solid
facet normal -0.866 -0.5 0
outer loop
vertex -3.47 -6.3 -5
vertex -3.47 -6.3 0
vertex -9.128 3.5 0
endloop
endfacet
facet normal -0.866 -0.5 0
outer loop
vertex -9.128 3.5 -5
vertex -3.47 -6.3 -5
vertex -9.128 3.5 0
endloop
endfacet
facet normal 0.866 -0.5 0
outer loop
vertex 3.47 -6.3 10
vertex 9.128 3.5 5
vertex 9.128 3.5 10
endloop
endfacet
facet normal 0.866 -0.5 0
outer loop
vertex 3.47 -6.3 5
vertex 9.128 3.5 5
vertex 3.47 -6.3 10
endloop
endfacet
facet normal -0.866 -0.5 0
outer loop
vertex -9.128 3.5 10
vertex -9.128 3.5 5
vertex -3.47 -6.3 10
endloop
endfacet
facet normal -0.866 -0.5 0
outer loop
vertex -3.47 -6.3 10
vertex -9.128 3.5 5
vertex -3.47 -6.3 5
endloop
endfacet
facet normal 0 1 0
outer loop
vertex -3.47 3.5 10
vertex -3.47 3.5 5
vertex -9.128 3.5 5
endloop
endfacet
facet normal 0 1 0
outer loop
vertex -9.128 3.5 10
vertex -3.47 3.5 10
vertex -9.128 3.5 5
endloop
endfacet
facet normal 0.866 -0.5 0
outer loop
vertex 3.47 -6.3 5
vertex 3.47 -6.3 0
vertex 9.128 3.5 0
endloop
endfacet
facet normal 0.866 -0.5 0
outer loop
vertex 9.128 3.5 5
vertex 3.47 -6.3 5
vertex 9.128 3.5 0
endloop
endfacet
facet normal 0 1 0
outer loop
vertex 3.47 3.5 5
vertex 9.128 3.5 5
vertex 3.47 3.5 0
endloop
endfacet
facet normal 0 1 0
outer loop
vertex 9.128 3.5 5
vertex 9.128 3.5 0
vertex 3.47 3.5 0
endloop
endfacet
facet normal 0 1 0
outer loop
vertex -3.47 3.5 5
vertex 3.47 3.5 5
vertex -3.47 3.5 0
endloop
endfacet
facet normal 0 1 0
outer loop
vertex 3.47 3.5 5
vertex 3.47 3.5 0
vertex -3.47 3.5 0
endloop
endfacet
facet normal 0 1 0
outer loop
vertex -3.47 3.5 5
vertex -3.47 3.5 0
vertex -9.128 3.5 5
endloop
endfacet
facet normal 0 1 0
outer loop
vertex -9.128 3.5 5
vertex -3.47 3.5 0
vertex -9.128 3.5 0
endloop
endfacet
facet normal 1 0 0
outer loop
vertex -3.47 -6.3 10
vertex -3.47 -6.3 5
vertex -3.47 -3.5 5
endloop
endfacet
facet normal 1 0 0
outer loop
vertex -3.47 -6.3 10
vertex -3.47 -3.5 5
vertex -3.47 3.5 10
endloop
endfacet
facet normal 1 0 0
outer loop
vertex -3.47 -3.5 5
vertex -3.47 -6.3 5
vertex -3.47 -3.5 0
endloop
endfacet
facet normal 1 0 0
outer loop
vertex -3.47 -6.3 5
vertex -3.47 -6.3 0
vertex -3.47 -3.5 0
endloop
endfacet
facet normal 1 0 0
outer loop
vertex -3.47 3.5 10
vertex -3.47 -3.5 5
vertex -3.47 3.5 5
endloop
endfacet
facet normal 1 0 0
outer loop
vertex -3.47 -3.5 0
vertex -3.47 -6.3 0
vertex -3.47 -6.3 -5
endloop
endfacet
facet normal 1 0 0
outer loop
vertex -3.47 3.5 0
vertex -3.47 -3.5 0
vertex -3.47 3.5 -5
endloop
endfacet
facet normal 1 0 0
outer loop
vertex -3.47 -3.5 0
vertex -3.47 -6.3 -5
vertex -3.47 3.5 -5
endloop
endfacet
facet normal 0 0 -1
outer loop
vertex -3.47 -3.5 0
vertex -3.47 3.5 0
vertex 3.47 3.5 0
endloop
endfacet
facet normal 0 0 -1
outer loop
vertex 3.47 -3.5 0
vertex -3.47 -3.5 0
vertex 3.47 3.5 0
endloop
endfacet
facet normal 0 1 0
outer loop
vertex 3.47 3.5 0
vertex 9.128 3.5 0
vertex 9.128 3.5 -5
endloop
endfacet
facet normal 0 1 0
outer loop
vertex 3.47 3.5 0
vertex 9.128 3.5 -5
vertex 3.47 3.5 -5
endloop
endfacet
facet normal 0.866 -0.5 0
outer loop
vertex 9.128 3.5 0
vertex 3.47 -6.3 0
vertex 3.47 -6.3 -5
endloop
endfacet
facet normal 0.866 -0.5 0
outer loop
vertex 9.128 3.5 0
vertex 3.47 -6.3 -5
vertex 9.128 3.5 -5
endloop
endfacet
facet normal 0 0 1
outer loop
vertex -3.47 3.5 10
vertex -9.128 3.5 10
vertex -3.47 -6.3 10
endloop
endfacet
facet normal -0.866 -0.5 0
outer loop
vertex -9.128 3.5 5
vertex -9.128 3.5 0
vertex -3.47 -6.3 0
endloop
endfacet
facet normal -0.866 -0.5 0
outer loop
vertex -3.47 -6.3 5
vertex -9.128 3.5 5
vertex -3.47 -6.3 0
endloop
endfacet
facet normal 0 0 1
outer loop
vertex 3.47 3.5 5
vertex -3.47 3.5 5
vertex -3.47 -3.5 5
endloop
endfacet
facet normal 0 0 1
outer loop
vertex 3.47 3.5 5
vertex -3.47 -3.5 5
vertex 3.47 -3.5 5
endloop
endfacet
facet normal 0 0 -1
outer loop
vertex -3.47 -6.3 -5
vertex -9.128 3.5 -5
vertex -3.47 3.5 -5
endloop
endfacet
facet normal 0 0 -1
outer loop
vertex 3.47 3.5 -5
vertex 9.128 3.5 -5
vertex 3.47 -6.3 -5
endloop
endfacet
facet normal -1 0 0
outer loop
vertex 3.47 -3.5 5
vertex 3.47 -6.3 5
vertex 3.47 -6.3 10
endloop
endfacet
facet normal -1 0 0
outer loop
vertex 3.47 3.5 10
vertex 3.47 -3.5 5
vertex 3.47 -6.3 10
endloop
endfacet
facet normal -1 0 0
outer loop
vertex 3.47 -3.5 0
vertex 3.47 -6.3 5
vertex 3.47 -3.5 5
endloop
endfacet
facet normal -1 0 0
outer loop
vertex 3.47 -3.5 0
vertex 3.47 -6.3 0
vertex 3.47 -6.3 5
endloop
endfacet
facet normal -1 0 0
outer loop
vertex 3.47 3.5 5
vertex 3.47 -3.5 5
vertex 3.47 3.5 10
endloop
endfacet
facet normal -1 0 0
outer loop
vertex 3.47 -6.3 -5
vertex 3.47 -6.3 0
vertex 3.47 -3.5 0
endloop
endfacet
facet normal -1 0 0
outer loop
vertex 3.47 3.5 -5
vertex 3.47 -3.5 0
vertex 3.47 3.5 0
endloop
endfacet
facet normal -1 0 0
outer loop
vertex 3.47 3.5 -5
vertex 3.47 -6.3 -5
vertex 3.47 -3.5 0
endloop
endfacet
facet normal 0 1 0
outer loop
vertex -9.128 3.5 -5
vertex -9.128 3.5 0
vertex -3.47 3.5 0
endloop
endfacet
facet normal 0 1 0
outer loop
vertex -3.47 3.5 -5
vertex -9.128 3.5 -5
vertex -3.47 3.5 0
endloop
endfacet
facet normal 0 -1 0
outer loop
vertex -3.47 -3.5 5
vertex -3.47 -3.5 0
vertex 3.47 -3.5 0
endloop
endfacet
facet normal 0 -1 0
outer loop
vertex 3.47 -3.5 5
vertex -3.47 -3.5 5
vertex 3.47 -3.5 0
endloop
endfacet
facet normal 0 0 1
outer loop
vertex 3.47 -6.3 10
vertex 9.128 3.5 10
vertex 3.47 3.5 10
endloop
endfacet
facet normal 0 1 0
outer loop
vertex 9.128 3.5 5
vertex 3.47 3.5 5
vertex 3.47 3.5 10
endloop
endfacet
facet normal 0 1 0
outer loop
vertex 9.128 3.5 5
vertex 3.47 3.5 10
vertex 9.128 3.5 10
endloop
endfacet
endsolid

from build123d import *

# Parameters (mm, degrees)
PAD_DEPTH    = 5
PAD001_DEPTH = 5
PAD002_DEPTH = 5


with BuildPart() as part:
    # Sketch → Pad (new body)
    with BuildSketch(Plane.XY):
        Polygon((-3.47, -3.5), (3.47, -3.5), (3.47, -6.3), (9.128033, 3.5), (3.47, 3.5), (-3.47, 3.5), (-9.128033, 3.5), (-3.47, -6.3), align=None)
    extrude(amount=PAD_DEPTH)

    # Sketch001 (on Face9 of Pad) → Pad001 (join)
    with BuildSketch(Plane(origin=(0, 0, 0), x_dir=(1, 0, 0), z_dir=(0, 0, -1))):
        Polygon((-3.47, 6.299921), (-9.128033, -3.500079), (-3.47, -3.500079), align=None)
        Polygon((3.47, 6.299921), (9.128033, -3.500079), (3.47, -3.500079), align=None)
    extrude(amount=PAD001_DEPTH)

    # Sketch002 (on Face5 of Pad001) → Pad002 (join)
    with BuildSketch(Plane.XY.offset(5)):
        Polygon((-9.128033, 3.500297), (-3.47, -6.299703), (-3.47, 3.500297), align=None)
        Polygon((3.47, -6.299703), (3.47, 3.500297), (9.128033, 3.500297), align=None)
    extrude(amount=PAD002_DEPTH)


solid = part.part
